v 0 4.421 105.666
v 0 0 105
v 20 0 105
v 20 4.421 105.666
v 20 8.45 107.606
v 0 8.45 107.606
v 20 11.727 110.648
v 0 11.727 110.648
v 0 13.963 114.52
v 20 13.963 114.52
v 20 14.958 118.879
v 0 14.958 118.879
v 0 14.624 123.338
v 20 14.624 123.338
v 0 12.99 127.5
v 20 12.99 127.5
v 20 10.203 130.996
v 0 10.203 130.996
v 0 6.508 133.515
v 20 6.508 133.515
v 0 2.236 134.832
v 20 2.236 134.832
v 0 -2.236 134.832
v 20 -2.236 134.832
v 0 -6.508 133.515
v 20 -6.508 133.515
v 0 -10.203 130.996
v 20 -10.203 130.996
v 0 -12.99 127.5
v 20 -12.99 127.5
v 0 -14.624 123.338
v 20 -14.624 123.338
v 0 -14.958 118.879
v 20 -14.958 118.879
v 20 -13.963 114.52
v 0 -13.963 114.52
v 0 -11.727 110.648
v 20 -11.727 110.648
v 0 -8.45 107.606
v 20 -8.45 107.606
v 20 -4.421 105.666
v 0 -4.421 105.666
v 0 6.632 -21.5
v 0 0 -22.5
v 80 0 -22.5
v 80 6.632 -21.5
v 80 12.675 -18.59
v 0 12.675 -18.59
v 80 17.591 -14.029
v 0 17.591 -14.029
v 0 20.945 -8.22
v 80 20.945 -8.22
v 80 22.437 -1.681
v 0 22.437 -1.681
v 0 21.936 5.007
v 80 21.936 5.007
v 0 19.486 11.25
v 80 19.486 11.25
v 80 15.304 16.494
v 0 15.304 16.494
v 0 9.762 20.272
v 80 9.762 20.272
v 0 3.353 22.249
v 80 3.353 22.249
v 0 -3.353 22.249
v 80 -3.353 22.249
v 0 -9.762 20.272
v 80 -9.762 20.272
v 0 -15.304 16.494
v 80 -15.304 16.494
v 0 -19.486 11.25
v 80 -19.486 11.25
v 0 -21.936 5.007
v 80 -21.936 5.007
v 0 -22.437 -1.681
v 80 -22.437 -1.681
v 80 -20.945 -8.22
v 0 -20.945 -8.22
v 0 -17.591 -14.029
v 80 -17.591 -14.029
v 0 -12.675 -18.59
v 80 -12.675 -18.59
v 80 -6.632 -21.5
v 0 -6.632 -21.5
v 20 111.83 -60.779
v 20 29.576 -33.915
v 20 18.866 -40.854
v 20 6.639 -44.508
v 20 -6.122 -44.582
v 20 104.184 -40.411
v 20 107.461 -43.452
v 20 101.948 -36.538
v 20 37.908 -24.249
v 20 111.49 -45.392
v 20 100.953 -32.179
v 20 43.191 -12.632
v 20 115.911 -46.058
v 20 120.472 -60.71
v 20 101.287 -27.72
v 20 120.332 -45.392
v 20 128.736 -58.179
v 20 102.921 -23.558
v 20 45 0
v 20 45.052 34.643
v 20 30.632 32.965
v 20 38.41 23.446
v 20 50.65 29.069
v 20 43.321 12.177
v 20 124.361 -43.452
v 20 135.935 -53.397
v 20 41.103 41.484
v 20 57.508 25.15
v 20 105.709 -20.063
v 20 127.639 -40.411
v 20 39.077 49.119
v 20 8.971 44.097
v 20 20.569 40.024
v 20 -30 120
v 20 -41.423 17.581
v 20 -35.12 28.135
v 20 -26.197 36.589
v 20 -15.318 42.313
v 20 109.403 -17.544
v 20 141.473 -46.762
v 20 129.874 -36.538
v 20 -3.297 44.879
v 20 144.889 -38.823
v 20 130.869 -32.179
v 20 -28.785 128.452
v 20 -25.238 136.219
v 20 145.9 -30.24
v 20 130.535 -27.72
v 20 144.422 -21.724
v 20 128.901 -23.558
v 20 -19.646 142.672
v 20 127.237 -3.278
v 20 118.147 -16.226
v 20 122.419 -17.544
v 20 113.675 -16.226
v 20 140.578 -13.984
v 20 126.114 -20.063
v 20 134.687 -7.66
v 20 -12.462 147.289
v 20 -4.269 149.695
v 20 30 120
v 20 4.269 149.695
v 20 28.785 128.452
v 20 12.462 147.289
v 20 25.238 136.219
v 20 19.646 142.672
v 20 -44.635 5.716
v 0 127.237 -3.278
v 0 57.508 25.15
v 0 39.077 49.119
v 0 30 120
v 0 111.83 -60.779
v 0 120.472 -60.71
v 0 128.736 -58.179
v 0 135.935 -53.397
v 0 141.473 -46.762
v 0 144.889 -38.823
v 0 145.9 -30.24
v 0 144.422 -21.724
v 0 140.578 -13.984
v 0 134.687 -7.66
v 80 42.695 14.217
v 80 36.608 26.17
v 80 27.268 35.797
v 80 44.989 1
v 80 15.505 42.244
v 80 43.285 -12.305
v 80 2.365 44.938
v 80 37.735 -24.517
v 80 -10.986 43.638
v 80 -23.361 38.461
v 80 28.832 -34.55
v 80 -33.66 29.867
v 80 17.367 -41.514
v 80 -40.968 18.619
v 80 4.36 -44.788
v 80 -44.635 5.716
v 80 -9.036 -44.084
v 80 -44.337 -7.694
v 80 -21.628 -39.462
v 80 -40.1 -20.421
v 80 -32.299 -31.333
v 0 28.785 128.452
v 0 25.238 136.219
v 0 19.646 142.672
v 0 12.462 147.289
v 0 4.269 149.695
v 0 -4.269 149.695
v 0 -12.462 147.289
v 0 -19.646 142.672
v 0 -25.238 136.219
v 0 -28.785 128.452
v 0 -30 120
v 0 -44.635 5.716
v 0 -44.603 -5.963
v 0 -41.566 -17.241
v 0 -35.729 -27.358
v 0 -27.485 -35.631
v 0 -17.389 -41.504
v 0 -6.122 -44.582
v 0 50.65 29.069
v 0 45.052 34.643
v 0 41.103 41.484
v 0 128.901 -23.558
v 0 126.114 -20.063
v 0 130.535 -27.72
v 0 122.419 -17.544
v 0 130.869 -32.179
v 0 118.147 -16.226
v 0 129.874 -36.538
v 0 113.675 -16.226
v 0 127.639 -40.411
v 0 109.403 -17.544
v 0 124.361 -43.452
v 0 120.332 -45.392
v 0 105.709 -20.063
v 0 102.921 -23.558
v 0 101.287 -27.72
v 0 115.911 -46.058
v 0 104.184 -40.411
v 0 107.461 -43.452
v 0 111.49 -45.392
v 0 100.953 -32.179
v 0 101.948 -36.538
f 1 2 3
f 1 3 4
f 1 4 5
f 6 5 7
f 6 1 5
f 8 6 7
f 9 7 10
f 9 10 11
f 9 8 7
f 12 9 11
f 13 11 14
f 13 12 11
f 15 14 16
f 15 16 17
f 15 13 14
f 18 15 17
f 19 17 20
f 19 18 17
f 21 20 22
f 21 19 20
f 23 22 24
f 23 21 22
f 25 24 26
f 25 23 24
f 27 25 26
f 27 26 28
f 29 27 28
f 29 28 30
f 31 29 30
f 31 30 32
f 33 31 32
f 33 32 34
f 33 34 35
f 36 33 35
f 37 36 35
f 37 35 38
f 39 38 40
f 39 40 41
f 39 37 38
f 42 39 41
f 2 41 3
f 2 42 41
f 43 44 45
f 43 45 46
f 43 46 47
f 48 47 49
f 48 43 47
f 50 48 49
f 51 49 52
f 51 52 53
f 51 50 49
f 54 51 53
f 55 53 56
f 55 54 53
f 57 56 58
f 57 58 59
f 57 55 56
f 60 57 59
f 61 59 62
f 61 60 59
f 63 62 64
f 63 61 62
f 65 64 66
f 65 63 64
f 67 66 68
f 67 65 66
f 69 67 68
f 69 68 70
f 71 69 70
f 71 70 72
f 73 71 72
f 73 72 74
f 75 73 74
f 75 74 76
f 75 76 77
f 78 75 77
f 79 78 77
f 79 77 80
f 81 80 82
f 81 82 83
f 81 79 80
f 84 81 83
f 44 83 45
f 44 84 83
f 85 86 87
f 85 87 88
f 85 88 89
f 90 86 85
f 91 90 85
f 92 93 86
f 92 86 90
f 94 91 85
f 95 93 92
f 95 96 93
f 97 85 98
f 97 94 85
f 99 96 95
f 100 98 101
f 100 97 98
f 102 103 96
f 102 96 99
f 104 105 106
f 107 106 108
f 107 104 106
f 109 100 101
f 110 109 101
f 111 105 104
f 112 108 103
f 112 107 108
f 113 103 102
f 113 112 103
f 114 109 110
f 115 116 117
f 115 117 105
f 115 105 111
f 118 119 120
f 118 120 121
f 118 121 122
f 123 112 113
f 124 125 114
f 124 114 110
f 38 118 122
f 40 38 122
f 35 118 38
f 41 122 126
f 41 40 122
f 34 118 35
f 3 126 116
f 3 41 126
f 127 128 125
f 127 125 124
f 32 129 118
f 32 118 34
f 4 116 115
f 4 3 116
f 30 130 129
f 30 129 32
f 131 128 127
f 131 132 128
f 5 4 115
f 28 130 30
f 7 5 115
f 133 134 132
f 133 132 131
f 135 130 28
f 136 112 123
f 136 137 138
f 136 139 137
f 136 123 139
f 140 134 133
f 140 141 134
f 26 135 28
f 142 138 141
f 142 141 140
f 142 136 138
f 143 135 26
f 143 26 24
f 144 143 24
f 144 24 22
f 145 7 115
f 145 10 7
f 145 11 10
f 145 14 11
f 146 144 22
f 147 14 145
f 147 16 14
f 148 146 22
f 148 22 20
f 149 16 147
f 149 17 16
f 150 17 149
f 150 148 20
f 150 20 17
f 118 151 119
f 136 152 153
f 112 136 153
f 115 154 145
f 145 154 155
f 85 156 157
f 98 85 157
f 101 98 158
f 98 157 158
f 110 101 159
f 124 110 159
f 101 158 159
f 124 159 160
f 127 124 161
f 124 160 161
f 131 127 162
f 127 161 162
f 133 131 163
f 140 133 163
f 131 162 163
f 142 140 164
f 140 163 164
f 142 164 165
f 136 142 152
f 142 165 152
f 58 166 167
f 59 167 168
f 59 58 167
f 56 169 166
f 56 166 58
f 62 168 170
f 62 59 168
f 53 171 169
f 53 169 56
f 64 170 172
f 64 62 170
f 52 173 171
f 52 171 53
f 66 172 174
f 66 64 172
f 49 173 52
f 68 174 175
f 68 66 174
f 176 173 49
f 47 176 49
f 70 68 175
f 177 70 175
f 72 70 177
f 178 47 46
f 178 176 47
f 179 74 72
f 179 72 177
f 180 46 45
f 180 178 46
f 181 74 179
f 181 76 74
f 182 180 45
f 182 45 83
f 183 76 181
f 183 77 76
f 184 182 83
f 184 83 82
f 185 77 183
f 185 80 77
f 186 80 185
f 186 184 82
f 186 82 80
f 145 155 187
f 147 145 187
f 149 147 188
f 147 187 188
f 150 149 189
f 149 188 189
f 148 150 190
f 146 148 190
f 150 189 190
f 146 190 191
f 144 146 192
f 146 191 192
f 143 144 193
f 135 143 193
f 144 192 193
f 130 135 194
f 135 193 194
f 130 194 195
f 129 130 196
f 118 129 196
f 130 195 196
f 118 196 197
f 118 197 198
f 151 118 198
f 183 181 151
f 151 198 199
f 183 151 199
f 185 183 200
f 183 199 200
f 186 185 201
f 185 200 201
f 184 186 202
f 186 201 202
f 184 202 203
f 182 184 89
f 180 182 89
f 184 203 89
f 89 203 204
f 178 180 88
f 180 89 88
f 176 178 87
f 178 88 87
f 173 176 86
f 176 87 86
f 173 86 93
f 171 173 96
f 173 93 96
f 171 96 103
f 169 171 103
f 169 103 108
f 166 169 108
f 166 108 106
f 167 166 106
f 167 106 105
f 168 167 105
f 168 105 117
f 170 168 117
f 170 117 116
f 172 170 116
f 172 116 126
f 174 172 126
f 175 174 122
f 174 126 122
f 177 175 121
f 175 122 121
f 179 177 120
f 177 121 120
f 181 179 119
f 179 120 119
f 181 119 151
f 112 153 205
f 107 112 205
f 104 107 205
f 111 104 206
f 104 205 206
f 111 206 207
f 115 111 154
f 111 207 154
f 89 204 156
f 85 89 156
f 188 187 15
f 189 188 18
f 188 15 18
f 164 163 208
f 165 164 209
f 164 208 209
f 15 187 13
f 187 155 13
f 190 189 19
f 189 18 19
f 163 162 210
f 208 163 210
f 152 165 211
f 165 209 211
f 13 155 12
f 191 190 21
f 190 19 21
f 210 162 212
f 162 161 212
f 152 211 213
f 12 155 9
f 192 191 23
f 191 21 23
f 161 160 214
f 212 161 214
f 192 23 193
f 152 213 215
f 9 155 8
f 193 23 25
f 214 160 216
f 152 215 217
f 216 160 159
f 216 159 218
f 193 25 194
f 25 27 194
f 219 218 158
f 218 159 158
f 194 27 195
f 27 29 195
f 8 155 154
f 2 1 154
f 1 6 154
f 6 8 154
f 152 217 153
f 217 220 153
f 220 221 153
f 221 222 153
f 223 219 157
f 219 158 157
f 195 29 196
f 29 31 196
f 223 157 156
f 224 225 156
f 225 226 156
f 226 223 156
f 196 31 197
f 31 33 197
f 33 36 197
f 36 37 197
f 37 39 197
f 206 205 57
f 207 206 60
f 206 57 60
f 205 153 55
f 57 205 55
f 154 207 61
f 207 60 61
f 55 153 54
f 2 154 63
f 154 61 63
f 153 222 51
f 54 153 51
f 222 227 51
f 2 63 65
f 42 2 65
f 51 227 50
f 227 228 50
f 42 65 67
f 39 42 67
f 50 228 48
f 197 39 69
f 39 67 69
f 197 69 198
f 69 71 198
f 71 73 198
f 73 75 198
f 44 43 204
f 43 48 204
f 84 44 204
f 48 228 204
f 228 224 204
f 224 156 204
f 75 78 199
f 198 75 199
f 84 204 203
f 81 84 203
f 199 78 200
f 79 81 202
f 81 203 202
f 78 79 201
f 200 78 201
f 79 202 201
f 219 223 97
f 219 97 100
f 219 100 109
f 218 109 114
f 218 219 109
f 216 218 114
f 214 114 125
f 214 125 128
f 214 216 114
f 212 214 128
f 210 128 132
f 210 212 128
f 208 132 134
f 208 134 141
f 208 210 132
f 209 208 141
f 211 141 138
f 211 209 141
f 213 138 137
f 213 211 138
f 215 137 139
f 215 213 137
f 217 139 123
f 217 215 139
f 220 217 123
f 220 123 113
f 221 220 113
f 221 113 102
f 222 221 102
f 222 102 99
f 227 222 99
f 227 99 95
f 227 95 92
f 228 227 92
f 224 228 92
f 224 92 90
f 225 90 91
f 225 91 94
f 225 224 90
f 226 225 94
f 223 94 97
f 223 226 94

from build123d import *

# Parameters (mm, degrees)
SKETCH1_R           = 15
BOSS_EXTRUDE1_DEPTH = 20
SKETCH1_3_R         = 22.5
BOSS_EXTRUDE2_DEPTH = 80


with BuildPart() as part:
    # Sketch1 → Boss-Extrude1 (new body)
    with BuildSketch(Plane.YZ):
        with BuildLine():
            ThreePointArc((30, 120), (0, 150), (-30, 120))
            Line((-30, 120), (-44.635477489, 5.716130628))
            ThreePointArc((-44.635477489, 5.716130628), (2.863870895, 44.908776909), (45, 0))
            ThreePointArc((45, 0), (29.576190824, -33.915320083), (-6.122174948, -44.581599051))
            Line((-6.122174948, -44.581599051), (111.829649189, -60.779351446))
            ThreePointArc((111.829649189, -60.779351446), (144.888873943, -38.822856765), (127.236992817, -3.278362217))
            Line((127.236992817, -3.278362217), (57.508255637, 25.150091561))
            ThreePointArc((57.508255637, 25.150091561), (45.052202352, 34.642888154), (39.077164307, 49.119261005))
            Line((39.077164307, 49.119261005), (30, 120))
        make_face()
        with Locations((115.911099155, -31.058285412)):
            Circle(SKETCH1_R, mode=Mode.SUBTRACT)
        with Locations((0, 120)):
            Circle(SKETCH1_R, mode=Mode.SUBTRACT)
    extrude(amount=BOSS_EXTRUDE1_DEPTH)

    # Sketch1<3> → Boss-Extrude2 (add)
    with BuildSketch(Plane.YZ):
        with BuildLine():
            ThreePointArc((45, 0), (2.863870895, 44.908776909), (-44.635477489, 5.716130628))
            ThreePointArc((-44.635477489, 5.716130628), (-35.728843011, -27.357810166), (-6.122174948, -44.581599051))
            ThreePointArc((-6.122174948, -44.581599051), (29.576190824, -33.915320083), (45, 0))
        make_face()
        Circle(SKETCH1_3_R, mode=Mode.SUBTRACT)
    extrude(amount=BOSS_EXTRUDE2_DEPTH)


solid = part.part
